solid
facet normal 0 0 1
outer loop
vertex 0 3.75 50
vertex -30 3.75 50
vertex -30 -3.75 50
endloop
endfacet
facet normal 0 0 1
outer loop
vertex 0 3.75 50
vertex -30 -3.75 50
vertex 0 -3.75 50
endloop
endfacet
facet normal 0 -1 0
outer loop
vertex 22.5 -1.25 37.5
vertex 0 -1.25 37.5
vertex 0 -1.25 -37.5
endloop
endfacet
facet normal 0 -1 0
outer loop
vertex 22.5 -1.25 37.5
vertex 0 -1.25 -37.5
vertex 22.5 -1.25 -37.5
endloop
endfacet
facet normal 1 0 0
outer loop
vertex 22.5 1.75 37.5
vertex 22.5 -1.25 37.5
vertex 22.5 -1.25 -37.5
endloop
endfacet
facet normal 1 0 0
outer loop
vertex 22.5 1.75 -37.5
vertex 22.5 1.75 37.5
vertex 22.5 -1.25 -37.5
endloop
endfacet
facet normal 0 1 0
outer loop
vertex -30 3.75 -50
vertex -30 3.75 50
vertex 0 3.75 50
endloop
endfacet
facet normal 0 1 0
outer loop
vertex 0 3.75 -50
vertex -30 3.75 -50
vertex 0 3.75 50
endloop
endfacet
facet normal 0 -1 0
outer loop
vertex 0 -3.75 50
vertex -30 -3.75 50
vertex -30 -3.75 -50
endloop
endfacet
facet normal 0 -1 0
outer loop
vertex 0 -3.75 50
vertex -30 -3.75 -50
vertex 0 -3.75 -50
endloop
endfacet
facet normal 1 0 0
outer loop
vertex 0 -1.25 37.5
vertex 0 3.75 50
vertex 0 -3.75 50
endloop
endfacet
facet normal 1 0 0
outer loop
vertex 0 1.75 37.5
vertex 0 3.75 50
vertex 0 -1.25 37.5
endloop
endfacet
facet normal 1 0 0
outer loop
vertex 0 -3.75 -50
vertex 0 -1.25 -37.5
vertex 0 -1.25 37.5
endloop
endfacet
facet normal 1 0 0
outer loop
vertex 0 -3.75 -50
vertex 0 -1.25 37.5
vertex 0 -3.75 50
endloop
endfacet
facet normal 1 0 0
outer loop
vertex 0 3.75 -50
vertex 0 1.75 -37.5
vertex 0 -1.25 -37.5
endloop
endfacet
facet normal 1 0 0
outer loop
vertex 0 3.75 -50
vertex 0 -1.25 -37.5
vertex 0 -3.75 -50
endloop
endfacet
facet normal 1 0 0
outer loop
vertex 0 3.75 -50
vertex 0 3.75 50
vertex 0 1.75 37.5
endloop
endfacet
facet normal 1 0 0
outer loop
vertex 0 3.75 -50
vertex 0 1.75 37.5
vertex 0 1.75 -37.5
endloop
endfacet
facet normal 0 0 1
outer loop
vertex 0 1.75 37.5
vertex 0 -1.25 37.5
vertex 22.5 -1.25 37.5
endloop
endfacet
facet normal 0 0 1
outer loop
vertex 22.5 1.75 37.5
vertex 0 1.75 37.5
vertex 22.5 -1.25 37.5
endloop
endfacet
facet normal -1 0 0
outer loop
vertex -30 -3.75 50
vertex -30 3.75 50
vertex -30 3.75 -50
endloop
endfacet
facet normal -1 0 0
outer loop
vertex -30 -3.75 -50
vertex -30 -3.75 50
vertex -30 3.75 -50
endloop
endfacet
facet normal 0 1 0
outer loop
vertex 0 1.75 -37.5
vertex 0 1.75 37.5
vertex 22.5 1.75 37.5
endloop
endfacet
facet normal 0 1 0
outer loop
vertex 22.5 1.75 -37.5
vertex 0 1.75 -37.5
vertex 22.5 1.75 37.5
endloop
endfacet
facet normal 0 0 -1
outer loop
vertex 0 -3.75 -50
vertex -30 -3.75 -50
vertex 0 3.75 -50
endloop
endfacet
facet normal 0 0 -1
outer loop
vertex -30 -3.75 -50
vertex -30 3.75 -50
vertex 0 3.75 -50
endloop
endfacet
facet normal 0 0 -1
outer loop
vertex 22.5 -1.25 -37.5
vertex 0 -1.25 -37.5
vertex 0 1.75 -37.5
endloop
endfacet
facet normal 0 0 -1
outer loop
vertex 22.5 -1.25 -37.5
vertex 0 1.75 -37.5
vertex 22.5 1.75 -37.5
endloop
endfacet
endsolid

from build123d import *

# Parameters (mm, degrees)
SKETCH1_W               = 30
SKETCH1_H               = 100
BOSS_EXTRUDE1_DEPTH     = 3.75
BOSS_EXTRUDE2_START     = -5
BOSS_EXTRUDE2_OUTLINE_W = 22.5
BOSS_EXTRUDE2_OUTLINE_H = 75
BOSS_EXTRUDE2_DEPTH     = 3


# Read off the part's stored shape, not the designer's step: Boss-Extrude2
with BuildPart() as part:
    # Sketch1 → Boss-Extrude1 (new, symmetric)
    with BuildSketch(Plane(origin=(0, 0, 0), x_dir=(1, 0, 0), z_dir=(0, 1, 0))):
        with Locations((-15, 0)):
            Rectangle(SKETCH1_W, SKETCH1_H)
    extrude(amount=BOSS_EXTRUDE1_DEPTH, both=True)

    # Boss-Extrude2 outline → Boss-Extrude2 (add)
    with BuildSketch(Plane(origin=(0, 3.75, 0), x_dir=(1, 0, 0), z_dir=(0, 1, 0)).offset(BOSS_EXTRUDE2_START)):
        with Locations((11.25, 0)):
            Rectangle(BOSS_EXTRUDE2_OUTLINE_W, BOSS_EXTRUDE2_OUTLINE_H)
    extrude(amount=BOSS_EXTRUDE2_DEPTH)


solid = part.part
